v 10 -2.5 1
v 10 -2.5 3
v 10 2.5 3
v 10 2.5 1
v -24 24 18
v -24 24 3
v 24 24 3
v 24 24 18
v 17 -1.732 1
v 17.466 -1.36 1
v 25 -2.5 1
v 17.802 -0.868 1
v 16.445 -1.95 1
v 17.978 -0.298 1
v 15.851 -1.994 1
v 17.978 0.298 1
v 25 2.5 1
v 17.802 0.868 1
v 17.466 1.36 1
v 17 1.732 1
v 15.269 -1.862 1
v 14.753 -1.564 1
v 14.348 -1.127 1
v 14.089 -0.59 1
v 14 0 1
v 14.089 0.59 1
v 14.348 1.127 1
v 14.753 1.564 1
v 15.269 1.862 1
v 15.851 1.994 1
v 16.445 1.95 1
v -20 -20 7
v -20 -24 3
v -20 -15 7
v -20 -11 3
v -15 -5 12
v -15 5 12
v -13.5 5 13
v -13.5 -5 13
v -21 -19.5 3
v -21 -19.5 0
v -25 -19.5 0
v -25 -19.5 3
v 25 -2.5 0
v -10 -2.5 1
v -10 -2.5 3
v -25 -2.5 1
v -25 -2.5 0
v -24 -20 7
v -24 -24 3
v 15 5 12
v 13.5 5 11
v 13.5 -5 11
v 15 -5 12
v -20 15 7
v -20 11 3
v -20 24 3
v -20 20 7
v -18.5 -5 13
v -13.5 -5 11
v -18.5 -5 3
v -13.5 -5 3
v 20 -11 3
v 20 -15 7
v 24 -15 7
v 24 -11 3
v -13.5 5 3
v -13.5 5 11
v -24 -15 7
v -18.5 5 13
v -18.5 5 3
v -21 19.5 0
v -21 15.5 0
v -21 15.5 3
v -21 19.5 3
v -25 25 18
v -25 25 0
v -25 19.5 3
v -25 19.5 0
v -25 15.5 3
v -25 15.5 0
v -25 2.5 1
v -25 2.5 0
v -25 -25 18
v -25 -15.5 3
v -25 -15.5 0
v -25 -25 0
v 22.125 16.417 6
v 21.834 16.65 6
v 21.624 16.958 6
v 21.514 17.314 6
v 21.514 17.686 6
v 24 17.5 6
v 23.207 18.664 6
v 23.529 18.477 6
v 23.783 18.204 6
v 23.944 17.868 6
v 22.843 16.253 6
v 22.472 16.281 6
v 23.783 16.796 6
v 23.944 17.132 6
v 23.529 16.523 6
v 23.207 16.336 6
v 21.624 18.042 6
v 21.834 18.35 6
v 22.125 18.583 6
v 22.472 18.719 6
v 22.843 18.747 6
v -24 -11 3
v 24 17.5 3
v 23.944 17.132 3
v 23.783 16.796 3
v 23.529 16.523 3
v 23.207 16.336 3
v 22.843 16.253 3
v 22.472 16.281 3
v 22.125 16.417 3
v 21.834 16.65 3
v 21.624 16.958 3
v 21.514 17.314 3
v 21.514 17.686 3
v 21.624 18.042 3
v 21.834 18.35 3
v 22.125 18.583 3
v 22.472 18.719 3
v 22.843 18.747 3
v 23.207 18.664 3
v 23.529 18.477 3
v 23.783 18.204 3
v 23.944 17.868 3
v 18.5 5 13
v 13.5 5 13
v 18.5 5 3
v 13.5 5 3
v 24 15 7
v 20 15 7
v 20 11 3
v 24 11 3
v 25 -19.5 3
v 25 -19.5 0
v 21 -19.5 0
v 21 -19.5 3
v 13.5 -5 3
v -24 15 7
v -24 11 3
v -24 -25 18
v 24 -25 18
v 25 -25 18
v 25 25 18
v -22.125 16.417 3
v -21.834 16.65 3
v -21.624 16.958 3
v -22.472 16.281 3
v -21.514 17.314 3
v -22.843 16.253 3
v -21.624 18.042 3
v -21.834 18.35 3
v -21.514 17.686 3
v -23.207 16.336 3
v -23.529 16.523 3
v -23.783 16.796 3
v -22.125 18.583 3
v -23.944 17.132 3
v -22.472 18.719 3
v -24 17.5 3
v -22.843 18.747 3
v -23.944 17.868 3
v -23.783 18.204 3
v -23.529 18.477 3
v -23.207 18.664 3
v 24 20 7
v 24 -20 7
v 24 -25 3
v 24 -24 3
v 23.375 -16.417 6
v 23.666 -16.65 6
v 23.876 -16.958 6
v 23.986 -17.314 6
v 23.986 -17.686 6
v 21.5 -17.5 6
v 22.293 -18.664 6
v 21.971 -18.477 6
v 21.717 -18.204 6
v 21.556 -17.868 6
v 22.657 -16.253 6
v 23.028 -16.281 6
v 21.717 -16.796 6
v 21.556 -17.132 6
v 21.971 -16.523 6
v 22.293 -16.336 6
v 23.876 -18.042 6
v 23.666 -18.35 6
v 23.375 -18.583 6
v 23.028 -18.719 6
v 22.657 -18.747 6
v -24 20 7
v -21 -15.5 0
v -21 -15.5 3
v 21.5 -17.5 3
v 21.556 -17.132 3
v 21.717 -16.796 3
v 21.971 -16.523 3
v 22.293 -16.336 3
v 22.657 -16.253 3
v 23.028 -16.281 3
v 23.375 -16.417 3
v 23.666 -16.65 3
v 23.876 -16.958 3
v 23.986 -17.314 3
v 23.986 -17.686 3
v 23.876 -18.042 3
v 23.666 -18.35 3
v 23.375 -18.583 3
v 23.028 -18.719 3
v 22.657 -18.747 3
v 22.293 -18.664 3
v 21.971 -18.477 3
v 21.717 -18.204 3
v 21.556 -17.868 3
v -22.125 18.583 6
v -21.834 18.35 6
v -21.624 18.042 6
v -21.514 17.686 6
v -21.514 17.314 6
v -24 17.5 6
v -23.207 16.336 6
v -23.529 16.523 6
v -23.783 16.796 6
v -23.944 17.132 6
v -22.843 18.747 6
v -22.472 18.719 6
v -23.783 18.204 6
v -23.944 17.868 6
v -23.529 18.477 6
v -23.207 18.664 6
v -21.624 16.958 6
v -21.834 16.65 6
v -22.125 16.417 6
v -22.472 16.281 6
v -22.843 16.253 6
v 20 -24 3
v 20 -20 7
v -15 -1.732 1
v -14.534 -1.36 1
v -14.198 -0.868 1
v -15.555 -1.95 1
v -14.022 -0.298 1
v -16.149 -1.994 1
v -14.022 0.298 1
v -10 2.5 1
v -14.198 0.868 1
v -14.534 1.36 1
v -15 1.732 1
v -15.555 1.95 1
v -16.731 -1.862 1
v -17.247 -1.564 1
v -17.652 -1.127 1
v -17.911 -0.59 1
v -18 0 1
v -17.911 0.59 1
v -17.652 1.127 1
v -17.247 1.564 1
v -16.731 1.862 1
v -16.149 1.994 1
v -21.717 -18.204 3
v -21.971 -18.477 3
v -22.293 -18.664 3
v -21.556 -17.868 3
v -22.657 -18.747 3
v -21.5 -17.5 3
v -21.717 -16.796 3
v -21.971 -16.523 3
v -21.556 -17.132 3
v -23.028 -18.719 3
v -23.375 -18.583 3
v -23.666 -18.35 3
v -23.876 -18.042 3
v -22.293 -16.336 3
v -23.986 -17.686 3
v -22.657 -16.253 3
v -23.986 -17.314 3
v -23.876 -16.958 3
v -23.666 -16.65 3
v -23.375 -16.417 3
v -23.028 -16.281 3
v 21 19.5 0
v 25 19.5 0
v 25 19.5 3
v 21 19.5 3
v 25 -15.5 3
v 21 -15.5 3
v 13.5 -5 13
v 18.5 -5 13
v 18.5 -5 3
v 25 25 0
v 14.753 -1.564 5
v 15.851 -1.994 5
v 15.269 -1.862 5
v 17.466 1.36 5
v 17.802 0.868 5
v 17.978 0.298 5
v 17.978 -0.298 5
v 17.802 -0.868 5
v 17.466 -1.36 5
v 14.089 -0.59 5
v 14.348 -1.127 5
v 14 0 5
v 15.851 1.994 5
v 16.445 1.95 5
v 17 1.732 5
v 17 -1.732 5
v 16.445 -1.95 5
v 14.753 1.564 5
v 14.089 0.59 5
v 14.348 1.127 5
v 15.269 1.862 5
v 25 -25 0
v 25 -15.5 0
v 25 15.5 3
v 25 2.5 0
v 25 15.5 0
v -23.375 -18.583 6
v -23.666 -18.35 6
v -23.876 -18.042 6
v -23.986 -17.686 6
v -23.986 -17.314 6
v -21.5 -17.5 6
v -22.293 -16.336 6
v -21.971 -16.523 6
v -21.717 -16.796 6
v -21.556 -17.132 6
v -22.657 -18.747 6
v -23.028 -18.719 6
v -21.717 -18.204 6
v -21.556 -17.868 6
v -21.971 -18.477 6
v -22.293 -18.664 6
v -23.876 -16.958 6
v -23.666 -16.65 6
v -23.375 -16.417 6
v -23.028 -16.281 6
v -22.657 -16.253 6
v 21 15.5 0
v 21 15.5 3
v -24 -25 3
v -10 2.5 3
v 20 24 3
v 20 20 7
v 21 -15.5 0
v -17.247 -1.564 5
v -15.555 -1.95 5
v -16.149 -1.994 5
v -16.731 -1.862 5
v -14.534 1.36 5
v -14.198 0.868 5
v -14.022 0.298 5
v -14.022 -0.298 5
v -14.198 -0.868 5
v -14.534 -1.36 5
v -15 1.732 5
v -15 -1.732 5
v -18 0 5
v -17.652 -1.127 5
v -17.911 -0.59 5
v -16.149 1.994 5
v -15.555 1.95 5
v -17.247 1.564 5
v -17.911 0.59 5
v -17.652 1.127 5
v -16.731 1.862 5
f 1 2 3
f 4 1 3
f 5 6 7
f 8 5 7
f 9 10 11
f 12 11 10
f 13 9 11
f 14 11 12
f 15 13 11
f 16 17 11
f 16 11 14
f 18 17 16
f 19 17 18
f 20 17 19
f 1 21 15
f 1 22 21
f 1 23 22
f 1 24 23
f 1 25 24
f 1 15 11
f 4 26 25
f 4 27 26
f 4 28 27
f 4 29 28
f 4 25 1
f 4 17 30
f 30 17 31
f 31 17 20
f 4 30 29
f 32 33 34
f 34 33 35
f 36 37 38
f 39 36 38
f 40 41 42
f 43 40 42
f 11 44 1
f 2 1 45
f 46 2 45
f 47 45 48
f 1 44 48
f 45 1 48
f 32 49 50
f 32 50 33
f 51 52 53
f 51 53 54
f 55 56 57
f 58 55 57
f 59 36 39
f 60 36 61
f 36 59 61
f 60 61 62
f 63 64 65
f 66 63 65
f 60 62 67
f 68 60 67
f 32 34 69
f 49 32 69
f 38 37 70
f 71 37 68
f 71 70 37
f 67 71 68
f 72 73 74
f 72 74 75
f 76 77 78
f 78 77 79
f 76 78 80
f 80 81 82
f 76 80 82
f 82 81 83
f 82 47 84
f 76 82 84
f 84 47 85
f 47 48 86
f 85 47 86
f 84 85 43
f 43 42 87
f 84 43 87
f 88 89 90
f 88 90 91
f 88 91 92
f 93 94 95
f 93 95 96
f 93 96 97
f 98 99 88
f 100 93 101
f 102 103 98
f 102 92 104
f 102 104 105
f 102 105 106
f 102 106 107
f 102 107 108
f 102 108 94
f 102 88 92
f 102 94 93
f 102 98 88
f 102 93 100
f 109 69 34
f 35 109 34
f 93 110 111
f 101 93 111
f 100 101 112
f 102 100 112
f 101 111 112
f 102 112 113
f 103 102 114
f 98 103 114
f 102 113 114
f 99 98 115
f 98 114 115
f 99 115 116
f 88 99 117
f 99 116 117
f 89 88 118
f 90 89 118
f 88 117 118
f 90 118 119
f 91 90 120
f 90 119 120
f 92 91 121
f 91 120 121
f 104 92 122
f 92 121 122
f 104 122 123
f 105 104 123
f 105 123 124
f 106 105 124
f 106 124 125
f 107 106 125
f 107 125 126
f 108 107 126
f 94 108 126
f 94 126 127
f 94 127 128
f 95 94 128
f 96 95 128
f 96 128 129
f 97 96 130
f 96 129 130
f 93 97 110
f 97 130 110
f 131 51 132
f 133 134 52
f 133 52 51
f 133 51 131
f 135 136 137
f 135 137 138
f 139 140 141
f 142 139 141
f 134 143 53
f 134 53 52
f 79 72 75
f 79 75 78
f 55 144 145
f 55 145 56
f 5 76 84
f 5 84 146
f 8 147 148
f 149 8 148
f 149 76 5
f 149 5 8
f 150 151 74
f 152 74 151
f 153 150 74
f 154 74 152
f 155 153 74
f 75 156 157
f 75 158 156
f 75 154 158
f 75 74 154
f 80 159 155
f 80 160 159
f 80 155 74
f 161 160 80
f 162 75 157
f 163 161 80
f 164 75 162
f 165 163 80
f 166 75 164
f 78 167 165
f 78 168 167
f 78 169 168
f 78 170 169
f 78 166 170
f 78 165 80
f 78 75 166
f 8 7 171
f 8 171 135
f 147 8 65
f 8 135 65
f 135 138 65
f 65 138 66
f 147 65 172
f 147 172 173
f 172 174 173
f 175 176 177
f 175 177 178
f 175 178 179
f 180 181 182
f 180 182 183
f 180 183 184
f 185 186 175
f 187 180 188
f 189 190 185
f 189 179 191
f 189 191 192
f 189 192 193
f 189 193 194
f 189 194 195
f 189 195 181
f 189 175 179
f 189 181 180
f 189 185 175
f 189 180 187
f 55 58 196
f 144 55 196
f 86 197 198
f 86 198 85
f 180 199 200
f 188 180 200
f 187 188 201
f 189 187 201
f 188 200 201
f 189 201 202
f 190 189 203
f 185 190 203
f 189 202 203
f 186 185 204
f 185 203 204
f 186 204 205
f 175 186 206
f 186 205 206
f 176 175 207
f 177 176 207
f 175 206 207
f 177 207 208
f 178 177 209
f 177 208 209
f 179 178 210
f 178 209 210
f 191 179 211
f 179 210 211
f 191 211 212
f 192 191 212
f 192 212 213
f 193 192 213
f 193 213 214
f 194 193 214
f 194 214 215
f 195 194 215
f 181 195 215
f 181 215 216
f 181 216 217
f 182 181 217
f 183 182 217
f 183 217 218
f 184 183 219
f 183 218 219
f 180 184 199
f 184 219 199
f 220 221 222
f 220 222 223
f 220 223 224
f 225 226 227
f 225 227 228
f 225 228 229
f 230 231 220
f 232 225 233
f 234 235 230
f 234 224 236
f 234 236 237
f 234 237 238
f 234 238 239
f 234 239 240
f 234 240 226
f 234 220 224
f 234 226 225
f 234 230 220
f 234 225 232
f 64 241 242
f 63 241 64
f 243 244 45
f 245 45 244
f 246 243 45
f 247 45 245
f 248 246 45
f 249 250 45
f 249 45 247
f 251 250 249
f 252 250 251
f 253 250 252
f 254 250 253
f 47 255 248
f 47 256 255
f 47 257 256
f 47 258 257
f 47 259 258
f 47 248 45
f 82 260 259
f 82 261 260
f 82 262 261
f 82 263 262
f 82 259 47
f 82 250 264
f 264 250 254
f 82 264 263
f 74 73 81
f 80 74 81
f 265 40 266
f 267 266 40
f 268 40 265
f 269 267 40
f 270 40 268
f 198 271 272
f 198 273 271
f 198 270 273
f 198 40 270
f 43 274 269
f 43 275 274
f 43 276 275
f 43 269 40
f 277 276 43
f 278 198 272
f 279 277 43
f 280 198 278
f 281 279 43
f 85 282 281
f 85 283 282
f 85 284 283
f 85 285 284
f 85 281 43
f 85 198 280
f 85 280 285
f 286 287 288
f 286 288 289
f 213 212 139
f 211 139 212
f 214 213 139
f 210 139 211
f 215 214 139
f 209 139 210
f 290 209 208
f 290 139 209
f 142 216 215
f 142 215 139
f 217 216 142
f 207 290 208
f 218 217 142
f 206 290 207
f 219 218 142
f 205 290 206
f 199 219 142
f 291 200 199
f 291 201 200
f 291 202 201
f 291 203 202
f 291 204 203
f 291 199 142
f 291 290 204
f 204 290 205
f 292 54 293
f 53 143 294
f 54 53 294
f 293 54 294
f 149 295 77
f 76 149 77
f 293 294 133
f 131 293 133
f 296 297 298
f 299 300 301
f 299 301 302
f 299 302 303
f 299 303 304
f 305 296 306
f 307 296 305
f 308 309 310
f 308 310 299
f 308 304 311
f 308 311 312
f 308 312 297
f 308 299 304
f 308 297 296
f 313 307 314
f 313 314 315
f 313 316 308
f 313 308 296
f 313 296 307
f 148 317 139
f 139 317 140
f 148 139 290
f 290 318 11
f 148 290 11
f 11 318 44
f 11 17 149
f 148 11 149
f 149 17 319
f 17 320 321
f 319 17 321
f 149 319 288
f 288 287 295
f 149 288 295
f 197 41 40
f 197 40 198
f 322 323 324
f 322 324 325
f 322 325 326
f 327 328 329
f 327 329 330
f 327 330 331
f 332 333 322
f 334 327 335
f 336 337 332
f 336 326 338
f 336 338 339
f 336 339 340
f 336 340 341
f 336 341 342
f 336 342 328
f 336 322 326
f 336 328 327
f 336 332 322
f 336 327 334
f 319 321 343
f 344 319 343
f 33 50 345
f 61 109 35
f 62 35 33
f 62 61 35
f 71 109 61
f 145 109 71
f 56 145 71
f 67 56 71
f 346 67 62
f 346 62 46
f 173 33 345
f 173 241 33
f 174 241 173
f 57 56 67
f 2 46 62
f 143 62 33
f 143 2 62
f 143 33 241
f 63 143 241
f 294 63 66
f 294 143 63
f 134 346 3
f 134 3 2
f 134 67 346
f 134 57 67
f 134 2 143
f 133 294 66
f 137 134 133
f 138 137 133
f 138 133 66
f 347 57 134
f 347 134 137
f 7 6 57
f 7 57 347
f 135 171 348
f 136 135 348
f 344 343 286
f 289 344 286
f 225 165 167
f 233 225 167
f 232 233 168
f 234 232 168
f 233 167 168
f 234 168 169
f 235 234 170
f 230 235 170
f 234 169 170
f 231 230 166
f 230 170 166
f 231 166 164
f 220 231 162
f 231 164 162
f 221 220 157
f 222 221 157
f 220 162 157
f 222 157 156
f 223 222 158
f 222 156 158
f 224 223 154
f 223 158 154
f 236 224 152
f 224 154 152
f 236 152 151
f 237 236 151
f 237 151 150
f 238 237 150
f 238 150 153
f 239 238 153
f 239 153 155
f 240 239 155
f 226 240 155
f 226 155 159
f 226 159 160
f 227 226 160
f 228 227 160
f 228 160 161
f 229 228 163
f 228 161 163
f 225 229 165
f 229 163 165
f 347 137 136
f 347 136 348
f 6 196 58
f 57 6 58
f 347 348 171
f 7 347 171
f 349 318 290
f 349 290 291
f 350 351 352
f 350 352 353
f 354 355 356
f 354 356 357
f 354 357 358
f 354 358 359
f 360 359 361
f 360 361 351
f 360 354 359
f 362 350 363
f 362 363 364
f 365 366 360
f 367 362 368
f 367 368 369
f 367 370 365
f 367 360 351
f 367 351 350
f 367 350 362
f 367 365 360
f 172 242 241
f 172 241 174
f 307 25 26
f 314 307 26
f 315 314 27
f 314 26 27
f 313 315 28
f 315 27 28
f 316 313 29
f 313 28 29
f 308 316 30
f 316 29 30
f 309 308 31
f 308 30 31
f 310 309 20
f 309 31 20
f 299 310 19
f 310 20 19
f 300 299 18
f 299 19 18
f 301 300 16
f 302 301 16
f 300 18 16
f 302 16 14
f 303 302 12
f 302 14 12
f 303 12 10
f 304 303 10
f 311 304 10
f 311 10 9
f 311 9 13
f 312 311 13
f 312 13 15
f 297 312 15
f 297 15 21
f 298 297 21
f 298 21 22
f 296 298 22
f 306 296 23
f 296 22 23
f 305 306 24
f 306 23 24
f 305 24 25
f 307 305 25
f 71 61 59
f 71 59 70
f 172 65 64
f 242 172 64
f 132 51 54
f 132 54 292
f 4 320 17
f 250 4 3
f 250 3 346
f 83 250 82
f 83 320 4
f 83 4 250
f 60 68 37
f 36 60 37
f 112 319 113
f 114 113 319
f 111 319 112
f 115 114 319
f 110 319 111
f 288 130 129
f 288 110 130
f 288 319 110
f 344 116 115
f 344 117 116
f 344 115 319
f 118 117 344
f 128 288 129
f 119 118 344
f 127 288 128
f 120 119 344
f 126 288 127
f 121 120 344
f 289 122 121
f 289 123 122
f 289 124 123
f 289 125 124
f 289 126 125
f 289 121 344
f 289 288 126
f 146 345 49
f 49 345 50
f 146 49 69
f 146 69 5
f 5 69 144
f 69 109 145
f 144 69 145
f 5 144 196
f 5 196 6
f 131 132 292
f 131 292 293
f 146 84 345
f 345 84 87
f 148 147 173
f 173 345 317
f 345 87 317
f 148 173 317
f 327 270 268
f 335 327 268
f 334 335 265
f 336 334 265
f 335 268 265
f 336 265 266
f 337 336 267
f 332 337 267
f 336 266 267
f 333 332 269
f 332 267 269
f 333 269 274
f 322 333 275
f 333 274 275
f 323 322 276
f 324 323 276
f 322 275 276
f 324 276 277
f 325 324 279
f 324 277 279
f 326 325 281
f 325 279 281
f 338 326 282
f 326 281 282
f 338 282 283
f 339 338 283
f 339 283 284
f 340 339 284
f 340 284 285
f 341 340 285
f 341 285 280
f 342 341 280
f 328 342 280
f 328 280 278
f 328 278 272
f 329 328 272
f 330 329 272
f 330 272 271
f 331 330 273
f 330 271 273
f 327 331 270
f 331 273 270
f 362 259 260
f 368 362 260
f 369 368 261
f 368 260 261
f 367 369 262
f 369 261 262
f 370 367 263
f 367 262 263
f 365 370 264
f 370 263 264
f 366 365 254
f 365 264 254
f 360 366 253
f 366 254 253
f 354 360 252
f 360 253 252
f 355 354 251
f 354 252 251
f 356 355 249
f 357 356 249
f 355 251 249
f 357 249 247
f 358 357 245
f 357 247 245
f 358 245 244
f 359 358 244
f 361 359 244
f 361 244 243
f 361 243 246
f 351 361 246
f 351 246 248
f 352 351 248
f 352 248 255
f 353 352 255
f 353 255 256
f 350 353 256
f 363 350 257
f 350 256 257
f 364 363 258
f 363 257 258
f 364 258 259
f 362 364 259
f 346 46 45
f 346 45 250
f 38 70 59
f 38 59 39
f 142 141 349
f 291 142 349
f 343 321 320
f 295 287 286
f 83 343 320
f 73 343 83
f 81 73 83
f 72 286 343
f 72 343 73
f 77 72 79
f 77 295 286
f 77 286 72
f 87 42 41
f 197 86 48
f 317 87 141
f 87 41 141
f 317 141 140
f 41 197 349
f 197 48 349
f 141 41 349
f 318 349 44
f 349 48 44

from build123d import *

# Parameters (mm, degrees)
SKICA1_W                  = 50
SKICA1_H                  = 50
P_IDAT_VYSUNUT_M2_DEPTH   = 3
SKICA4_W                  = 20
SKICA4_H                  = 5
ODEBRAT_VYSUNUT_M1_DEPTH  = 2
SKICA5_W                  = 50
SKICA5_H                  = 5
ODEBRAT_VYSUNUT_M3_DEPTH  = 1
SKICA10_W                 = 5
SKICA10_H                 = 10
P_IDAT_VYSUNUT_M6_DEPTH   = 10
ODEBRAT_VYSUNUT_M6_DEPTH  = 10
P_IDAT_VYSUNUT_M9_DEPTH   = 15
SKICA17_R                 = 2
ODEBRAT_VYSUNUT_M8_DEPTH  = 4
SKICA18_W                 = 5
SKICA18_H                 = 5
P_IDAT_VYSUNUT_M10_DEPTH  = 7
SKICA19_W                 = 4
SKICA19_H                 = 4
ODEBRAT_VYSUNUT_M10_DEPTH = 3
ZKOSEN_2_SIZE             = 4
SKICA20_R                 = 1.25
ODEBRAT_VYSUNUT_M11_DEPTH = 3


with BuildPart() as part:
    # Skica1 → Přidat vysunutím2 (new body)
    with BuildSketch(Plane.XY):
        Rectangle(SKICA1_W, SKICA1_H)
    extrude(amount=P_IDAT_VYSUNUT_M2_DEPTH)

    # Skica4 → Odebrat vysunutím1 (cut)
    with BuildSketch(Plane.XY.offset(3)):
        Rectangle(SKICA4_W, SKICA4_H)
    extrude(amount=-ODEBRAT_VYSUNUT_M1_DEPTH, mode=Mode.SUBTRACT)

    # Skica5 → Odebrat vysunutím3 (cut)
    with BuildSketch(Plane(origin=(0, 0, 0), x_dir=(-1, 0, 0), z_dir=(0, 0, -1))):
        Rectangle(SKICA5_W, SKICA5_H)
    extrude(amount=-ODEBRAT_VYSUNUT_M3_DEPTH, mode=Mode.SUBTRACT)

    # Skica10 → Přidat vysunutím6 (add)
    with BuildSketch(Plane.XY.offset(3)):
        with Locations((-16, 0)):
            Rectangle(SKICA10_W, SKICA10_H)
        with Locations((16, 0)):
            Rectangle(SKICA10_W, SKICA10_H)
    extrude(amount=P_IDAT_VYSUNUT_M6_DEPTH)

    # Skica12 → Odebrat vysunutím6 (cut)
    with BuildSketch(Plane(origin=(0, 5, 0), x_dir=(1, 0, 0), z_dir=(0, 1, 0))):
        Polygon((-13.5, -13), (-13.5, -11), (-15, -12), align=None)
        Polygon((13.5, -13), (13.5, -11), (15, -12), align=None)
    extrude(amount=-ODEBRAT_VYSUNUT_M6_DEPTH, mode=Mode.SUBTRACT)

    # Skica14 → Přidat vysunutím9 (add)
    with BuildSketch(Plane.XY.offset(3)):
        Polygon((25, 25), (-25, 25), (-25, -25), (-24, -25), (-24, 24), (24, 24), (24, -25), (25, -25), align=None)
    extrude(amount=P_IDAT_VYSUNUT_M9_DEPTH)

    # Skica17 → Odebrat vysunutím8 (cut)
    with BuildSketch(Plane(origin=(0, 0, 1), x_dir=(-1, 0, 0), z_dir=(0, 0, -1))):
        with Locations((-16, 0)):
            Circle(SKICA17_R)
        with Locations((16, 0)):
            Circle(SKICA17_R)
    extrude(amount=-ODEBRAT_VYSUNUT_M8_DEPTH, mode=Mode.SUBTRACT)

    # Skica18 → Přidat vysunutím10 (add)
    with BuildSketch(Plane(origin=(0, 0, 0), x_dir=(-1, 0, 0), z_dir=(0, 0, -1))):
        with Locations((-22.5, 17.5)):
            Rectangle(SKICA18_W, SKICA18_H)
        with Locations((22.5, 17.5)):
            Rectangle(SKICA18_W, SKICA18_H)
        with Locations((22.5, -17.5)):
            Rectangle(SKICA18_W, SKICA18_H)
        with Locations((-22.5, -17.5)):
            Rectangle(SKICA18_W, SKICA18_H)
    extrude(amount=-P_IDAT_VYSUNUT_M10_DEPTH)

    # Skica19 → Odebrat vysunutím10 (cut)
    with BuildSketch(Plane(origin=(0, 0, 0), x_dir=(-1, 0, 0), z_dir=(0, 0, -1))):
        with Locations((-23, -17.5)):
            Rectangle(SKICA19_W, SKICA19_H)
        with Locations((-23, 17.5)):
            Rectangle(SKICA19_W, SKICA19_H)
        with Locations((23, 17.5)):
            Rectangle(SKICA19_W, SKICA19_H)
        with Locations((23, -17.5)):
            Rectangle(SKICA19_W, SKICA19_H)
    extrude(amount=-ODEBRAT_VYSUNUT_M10_DEPTH, mode=Mode.SUBTRACT)

    # Zkosení2
    zkosen_2_edges = [part.edges().sort_by_distance(p)[0] for p in [
        (22, 15, 3),
        (22, 20, 3),
        (-22, 20, 3),
        (-22, 15, 3),
        (-22, -15, 3),
        (-22, -20, 3),
        (22, -20, 3),
        (22, -15, 3),
    ]]
    chamfer(zkosen_2_edges, length=ZKOSEN_2_SIZE - 0.0001)  # a hair under: the kernel refuses the full size

    # Skica20 → Odebrat vysunutím11 (cut)
    with BuildSketch(Plane(origin=(0, 0, 3), x_dir=(-1, 0, 0), z_dir=(0, 0, -1))):
        with Locations((22.75, 17.5)):
            Circle(SKICA20_R)
        with Locations(Location((22.75, -17.5, 0), (0, 0, 180))):
            Circle(SKICA20_R)
        with Locations((-22.75, -17.5)):
            Circle(SKICA20_R)
        with Locations(Location((-22.75, 17.5, 0), (0, 0, 180))):
            Circle(SKICA20_R)
    extrude(amount=-ODEBRAT_VYSUNUT_M11_DEPTH, mode=Mode.SUBTRACT)


solid = part.part
